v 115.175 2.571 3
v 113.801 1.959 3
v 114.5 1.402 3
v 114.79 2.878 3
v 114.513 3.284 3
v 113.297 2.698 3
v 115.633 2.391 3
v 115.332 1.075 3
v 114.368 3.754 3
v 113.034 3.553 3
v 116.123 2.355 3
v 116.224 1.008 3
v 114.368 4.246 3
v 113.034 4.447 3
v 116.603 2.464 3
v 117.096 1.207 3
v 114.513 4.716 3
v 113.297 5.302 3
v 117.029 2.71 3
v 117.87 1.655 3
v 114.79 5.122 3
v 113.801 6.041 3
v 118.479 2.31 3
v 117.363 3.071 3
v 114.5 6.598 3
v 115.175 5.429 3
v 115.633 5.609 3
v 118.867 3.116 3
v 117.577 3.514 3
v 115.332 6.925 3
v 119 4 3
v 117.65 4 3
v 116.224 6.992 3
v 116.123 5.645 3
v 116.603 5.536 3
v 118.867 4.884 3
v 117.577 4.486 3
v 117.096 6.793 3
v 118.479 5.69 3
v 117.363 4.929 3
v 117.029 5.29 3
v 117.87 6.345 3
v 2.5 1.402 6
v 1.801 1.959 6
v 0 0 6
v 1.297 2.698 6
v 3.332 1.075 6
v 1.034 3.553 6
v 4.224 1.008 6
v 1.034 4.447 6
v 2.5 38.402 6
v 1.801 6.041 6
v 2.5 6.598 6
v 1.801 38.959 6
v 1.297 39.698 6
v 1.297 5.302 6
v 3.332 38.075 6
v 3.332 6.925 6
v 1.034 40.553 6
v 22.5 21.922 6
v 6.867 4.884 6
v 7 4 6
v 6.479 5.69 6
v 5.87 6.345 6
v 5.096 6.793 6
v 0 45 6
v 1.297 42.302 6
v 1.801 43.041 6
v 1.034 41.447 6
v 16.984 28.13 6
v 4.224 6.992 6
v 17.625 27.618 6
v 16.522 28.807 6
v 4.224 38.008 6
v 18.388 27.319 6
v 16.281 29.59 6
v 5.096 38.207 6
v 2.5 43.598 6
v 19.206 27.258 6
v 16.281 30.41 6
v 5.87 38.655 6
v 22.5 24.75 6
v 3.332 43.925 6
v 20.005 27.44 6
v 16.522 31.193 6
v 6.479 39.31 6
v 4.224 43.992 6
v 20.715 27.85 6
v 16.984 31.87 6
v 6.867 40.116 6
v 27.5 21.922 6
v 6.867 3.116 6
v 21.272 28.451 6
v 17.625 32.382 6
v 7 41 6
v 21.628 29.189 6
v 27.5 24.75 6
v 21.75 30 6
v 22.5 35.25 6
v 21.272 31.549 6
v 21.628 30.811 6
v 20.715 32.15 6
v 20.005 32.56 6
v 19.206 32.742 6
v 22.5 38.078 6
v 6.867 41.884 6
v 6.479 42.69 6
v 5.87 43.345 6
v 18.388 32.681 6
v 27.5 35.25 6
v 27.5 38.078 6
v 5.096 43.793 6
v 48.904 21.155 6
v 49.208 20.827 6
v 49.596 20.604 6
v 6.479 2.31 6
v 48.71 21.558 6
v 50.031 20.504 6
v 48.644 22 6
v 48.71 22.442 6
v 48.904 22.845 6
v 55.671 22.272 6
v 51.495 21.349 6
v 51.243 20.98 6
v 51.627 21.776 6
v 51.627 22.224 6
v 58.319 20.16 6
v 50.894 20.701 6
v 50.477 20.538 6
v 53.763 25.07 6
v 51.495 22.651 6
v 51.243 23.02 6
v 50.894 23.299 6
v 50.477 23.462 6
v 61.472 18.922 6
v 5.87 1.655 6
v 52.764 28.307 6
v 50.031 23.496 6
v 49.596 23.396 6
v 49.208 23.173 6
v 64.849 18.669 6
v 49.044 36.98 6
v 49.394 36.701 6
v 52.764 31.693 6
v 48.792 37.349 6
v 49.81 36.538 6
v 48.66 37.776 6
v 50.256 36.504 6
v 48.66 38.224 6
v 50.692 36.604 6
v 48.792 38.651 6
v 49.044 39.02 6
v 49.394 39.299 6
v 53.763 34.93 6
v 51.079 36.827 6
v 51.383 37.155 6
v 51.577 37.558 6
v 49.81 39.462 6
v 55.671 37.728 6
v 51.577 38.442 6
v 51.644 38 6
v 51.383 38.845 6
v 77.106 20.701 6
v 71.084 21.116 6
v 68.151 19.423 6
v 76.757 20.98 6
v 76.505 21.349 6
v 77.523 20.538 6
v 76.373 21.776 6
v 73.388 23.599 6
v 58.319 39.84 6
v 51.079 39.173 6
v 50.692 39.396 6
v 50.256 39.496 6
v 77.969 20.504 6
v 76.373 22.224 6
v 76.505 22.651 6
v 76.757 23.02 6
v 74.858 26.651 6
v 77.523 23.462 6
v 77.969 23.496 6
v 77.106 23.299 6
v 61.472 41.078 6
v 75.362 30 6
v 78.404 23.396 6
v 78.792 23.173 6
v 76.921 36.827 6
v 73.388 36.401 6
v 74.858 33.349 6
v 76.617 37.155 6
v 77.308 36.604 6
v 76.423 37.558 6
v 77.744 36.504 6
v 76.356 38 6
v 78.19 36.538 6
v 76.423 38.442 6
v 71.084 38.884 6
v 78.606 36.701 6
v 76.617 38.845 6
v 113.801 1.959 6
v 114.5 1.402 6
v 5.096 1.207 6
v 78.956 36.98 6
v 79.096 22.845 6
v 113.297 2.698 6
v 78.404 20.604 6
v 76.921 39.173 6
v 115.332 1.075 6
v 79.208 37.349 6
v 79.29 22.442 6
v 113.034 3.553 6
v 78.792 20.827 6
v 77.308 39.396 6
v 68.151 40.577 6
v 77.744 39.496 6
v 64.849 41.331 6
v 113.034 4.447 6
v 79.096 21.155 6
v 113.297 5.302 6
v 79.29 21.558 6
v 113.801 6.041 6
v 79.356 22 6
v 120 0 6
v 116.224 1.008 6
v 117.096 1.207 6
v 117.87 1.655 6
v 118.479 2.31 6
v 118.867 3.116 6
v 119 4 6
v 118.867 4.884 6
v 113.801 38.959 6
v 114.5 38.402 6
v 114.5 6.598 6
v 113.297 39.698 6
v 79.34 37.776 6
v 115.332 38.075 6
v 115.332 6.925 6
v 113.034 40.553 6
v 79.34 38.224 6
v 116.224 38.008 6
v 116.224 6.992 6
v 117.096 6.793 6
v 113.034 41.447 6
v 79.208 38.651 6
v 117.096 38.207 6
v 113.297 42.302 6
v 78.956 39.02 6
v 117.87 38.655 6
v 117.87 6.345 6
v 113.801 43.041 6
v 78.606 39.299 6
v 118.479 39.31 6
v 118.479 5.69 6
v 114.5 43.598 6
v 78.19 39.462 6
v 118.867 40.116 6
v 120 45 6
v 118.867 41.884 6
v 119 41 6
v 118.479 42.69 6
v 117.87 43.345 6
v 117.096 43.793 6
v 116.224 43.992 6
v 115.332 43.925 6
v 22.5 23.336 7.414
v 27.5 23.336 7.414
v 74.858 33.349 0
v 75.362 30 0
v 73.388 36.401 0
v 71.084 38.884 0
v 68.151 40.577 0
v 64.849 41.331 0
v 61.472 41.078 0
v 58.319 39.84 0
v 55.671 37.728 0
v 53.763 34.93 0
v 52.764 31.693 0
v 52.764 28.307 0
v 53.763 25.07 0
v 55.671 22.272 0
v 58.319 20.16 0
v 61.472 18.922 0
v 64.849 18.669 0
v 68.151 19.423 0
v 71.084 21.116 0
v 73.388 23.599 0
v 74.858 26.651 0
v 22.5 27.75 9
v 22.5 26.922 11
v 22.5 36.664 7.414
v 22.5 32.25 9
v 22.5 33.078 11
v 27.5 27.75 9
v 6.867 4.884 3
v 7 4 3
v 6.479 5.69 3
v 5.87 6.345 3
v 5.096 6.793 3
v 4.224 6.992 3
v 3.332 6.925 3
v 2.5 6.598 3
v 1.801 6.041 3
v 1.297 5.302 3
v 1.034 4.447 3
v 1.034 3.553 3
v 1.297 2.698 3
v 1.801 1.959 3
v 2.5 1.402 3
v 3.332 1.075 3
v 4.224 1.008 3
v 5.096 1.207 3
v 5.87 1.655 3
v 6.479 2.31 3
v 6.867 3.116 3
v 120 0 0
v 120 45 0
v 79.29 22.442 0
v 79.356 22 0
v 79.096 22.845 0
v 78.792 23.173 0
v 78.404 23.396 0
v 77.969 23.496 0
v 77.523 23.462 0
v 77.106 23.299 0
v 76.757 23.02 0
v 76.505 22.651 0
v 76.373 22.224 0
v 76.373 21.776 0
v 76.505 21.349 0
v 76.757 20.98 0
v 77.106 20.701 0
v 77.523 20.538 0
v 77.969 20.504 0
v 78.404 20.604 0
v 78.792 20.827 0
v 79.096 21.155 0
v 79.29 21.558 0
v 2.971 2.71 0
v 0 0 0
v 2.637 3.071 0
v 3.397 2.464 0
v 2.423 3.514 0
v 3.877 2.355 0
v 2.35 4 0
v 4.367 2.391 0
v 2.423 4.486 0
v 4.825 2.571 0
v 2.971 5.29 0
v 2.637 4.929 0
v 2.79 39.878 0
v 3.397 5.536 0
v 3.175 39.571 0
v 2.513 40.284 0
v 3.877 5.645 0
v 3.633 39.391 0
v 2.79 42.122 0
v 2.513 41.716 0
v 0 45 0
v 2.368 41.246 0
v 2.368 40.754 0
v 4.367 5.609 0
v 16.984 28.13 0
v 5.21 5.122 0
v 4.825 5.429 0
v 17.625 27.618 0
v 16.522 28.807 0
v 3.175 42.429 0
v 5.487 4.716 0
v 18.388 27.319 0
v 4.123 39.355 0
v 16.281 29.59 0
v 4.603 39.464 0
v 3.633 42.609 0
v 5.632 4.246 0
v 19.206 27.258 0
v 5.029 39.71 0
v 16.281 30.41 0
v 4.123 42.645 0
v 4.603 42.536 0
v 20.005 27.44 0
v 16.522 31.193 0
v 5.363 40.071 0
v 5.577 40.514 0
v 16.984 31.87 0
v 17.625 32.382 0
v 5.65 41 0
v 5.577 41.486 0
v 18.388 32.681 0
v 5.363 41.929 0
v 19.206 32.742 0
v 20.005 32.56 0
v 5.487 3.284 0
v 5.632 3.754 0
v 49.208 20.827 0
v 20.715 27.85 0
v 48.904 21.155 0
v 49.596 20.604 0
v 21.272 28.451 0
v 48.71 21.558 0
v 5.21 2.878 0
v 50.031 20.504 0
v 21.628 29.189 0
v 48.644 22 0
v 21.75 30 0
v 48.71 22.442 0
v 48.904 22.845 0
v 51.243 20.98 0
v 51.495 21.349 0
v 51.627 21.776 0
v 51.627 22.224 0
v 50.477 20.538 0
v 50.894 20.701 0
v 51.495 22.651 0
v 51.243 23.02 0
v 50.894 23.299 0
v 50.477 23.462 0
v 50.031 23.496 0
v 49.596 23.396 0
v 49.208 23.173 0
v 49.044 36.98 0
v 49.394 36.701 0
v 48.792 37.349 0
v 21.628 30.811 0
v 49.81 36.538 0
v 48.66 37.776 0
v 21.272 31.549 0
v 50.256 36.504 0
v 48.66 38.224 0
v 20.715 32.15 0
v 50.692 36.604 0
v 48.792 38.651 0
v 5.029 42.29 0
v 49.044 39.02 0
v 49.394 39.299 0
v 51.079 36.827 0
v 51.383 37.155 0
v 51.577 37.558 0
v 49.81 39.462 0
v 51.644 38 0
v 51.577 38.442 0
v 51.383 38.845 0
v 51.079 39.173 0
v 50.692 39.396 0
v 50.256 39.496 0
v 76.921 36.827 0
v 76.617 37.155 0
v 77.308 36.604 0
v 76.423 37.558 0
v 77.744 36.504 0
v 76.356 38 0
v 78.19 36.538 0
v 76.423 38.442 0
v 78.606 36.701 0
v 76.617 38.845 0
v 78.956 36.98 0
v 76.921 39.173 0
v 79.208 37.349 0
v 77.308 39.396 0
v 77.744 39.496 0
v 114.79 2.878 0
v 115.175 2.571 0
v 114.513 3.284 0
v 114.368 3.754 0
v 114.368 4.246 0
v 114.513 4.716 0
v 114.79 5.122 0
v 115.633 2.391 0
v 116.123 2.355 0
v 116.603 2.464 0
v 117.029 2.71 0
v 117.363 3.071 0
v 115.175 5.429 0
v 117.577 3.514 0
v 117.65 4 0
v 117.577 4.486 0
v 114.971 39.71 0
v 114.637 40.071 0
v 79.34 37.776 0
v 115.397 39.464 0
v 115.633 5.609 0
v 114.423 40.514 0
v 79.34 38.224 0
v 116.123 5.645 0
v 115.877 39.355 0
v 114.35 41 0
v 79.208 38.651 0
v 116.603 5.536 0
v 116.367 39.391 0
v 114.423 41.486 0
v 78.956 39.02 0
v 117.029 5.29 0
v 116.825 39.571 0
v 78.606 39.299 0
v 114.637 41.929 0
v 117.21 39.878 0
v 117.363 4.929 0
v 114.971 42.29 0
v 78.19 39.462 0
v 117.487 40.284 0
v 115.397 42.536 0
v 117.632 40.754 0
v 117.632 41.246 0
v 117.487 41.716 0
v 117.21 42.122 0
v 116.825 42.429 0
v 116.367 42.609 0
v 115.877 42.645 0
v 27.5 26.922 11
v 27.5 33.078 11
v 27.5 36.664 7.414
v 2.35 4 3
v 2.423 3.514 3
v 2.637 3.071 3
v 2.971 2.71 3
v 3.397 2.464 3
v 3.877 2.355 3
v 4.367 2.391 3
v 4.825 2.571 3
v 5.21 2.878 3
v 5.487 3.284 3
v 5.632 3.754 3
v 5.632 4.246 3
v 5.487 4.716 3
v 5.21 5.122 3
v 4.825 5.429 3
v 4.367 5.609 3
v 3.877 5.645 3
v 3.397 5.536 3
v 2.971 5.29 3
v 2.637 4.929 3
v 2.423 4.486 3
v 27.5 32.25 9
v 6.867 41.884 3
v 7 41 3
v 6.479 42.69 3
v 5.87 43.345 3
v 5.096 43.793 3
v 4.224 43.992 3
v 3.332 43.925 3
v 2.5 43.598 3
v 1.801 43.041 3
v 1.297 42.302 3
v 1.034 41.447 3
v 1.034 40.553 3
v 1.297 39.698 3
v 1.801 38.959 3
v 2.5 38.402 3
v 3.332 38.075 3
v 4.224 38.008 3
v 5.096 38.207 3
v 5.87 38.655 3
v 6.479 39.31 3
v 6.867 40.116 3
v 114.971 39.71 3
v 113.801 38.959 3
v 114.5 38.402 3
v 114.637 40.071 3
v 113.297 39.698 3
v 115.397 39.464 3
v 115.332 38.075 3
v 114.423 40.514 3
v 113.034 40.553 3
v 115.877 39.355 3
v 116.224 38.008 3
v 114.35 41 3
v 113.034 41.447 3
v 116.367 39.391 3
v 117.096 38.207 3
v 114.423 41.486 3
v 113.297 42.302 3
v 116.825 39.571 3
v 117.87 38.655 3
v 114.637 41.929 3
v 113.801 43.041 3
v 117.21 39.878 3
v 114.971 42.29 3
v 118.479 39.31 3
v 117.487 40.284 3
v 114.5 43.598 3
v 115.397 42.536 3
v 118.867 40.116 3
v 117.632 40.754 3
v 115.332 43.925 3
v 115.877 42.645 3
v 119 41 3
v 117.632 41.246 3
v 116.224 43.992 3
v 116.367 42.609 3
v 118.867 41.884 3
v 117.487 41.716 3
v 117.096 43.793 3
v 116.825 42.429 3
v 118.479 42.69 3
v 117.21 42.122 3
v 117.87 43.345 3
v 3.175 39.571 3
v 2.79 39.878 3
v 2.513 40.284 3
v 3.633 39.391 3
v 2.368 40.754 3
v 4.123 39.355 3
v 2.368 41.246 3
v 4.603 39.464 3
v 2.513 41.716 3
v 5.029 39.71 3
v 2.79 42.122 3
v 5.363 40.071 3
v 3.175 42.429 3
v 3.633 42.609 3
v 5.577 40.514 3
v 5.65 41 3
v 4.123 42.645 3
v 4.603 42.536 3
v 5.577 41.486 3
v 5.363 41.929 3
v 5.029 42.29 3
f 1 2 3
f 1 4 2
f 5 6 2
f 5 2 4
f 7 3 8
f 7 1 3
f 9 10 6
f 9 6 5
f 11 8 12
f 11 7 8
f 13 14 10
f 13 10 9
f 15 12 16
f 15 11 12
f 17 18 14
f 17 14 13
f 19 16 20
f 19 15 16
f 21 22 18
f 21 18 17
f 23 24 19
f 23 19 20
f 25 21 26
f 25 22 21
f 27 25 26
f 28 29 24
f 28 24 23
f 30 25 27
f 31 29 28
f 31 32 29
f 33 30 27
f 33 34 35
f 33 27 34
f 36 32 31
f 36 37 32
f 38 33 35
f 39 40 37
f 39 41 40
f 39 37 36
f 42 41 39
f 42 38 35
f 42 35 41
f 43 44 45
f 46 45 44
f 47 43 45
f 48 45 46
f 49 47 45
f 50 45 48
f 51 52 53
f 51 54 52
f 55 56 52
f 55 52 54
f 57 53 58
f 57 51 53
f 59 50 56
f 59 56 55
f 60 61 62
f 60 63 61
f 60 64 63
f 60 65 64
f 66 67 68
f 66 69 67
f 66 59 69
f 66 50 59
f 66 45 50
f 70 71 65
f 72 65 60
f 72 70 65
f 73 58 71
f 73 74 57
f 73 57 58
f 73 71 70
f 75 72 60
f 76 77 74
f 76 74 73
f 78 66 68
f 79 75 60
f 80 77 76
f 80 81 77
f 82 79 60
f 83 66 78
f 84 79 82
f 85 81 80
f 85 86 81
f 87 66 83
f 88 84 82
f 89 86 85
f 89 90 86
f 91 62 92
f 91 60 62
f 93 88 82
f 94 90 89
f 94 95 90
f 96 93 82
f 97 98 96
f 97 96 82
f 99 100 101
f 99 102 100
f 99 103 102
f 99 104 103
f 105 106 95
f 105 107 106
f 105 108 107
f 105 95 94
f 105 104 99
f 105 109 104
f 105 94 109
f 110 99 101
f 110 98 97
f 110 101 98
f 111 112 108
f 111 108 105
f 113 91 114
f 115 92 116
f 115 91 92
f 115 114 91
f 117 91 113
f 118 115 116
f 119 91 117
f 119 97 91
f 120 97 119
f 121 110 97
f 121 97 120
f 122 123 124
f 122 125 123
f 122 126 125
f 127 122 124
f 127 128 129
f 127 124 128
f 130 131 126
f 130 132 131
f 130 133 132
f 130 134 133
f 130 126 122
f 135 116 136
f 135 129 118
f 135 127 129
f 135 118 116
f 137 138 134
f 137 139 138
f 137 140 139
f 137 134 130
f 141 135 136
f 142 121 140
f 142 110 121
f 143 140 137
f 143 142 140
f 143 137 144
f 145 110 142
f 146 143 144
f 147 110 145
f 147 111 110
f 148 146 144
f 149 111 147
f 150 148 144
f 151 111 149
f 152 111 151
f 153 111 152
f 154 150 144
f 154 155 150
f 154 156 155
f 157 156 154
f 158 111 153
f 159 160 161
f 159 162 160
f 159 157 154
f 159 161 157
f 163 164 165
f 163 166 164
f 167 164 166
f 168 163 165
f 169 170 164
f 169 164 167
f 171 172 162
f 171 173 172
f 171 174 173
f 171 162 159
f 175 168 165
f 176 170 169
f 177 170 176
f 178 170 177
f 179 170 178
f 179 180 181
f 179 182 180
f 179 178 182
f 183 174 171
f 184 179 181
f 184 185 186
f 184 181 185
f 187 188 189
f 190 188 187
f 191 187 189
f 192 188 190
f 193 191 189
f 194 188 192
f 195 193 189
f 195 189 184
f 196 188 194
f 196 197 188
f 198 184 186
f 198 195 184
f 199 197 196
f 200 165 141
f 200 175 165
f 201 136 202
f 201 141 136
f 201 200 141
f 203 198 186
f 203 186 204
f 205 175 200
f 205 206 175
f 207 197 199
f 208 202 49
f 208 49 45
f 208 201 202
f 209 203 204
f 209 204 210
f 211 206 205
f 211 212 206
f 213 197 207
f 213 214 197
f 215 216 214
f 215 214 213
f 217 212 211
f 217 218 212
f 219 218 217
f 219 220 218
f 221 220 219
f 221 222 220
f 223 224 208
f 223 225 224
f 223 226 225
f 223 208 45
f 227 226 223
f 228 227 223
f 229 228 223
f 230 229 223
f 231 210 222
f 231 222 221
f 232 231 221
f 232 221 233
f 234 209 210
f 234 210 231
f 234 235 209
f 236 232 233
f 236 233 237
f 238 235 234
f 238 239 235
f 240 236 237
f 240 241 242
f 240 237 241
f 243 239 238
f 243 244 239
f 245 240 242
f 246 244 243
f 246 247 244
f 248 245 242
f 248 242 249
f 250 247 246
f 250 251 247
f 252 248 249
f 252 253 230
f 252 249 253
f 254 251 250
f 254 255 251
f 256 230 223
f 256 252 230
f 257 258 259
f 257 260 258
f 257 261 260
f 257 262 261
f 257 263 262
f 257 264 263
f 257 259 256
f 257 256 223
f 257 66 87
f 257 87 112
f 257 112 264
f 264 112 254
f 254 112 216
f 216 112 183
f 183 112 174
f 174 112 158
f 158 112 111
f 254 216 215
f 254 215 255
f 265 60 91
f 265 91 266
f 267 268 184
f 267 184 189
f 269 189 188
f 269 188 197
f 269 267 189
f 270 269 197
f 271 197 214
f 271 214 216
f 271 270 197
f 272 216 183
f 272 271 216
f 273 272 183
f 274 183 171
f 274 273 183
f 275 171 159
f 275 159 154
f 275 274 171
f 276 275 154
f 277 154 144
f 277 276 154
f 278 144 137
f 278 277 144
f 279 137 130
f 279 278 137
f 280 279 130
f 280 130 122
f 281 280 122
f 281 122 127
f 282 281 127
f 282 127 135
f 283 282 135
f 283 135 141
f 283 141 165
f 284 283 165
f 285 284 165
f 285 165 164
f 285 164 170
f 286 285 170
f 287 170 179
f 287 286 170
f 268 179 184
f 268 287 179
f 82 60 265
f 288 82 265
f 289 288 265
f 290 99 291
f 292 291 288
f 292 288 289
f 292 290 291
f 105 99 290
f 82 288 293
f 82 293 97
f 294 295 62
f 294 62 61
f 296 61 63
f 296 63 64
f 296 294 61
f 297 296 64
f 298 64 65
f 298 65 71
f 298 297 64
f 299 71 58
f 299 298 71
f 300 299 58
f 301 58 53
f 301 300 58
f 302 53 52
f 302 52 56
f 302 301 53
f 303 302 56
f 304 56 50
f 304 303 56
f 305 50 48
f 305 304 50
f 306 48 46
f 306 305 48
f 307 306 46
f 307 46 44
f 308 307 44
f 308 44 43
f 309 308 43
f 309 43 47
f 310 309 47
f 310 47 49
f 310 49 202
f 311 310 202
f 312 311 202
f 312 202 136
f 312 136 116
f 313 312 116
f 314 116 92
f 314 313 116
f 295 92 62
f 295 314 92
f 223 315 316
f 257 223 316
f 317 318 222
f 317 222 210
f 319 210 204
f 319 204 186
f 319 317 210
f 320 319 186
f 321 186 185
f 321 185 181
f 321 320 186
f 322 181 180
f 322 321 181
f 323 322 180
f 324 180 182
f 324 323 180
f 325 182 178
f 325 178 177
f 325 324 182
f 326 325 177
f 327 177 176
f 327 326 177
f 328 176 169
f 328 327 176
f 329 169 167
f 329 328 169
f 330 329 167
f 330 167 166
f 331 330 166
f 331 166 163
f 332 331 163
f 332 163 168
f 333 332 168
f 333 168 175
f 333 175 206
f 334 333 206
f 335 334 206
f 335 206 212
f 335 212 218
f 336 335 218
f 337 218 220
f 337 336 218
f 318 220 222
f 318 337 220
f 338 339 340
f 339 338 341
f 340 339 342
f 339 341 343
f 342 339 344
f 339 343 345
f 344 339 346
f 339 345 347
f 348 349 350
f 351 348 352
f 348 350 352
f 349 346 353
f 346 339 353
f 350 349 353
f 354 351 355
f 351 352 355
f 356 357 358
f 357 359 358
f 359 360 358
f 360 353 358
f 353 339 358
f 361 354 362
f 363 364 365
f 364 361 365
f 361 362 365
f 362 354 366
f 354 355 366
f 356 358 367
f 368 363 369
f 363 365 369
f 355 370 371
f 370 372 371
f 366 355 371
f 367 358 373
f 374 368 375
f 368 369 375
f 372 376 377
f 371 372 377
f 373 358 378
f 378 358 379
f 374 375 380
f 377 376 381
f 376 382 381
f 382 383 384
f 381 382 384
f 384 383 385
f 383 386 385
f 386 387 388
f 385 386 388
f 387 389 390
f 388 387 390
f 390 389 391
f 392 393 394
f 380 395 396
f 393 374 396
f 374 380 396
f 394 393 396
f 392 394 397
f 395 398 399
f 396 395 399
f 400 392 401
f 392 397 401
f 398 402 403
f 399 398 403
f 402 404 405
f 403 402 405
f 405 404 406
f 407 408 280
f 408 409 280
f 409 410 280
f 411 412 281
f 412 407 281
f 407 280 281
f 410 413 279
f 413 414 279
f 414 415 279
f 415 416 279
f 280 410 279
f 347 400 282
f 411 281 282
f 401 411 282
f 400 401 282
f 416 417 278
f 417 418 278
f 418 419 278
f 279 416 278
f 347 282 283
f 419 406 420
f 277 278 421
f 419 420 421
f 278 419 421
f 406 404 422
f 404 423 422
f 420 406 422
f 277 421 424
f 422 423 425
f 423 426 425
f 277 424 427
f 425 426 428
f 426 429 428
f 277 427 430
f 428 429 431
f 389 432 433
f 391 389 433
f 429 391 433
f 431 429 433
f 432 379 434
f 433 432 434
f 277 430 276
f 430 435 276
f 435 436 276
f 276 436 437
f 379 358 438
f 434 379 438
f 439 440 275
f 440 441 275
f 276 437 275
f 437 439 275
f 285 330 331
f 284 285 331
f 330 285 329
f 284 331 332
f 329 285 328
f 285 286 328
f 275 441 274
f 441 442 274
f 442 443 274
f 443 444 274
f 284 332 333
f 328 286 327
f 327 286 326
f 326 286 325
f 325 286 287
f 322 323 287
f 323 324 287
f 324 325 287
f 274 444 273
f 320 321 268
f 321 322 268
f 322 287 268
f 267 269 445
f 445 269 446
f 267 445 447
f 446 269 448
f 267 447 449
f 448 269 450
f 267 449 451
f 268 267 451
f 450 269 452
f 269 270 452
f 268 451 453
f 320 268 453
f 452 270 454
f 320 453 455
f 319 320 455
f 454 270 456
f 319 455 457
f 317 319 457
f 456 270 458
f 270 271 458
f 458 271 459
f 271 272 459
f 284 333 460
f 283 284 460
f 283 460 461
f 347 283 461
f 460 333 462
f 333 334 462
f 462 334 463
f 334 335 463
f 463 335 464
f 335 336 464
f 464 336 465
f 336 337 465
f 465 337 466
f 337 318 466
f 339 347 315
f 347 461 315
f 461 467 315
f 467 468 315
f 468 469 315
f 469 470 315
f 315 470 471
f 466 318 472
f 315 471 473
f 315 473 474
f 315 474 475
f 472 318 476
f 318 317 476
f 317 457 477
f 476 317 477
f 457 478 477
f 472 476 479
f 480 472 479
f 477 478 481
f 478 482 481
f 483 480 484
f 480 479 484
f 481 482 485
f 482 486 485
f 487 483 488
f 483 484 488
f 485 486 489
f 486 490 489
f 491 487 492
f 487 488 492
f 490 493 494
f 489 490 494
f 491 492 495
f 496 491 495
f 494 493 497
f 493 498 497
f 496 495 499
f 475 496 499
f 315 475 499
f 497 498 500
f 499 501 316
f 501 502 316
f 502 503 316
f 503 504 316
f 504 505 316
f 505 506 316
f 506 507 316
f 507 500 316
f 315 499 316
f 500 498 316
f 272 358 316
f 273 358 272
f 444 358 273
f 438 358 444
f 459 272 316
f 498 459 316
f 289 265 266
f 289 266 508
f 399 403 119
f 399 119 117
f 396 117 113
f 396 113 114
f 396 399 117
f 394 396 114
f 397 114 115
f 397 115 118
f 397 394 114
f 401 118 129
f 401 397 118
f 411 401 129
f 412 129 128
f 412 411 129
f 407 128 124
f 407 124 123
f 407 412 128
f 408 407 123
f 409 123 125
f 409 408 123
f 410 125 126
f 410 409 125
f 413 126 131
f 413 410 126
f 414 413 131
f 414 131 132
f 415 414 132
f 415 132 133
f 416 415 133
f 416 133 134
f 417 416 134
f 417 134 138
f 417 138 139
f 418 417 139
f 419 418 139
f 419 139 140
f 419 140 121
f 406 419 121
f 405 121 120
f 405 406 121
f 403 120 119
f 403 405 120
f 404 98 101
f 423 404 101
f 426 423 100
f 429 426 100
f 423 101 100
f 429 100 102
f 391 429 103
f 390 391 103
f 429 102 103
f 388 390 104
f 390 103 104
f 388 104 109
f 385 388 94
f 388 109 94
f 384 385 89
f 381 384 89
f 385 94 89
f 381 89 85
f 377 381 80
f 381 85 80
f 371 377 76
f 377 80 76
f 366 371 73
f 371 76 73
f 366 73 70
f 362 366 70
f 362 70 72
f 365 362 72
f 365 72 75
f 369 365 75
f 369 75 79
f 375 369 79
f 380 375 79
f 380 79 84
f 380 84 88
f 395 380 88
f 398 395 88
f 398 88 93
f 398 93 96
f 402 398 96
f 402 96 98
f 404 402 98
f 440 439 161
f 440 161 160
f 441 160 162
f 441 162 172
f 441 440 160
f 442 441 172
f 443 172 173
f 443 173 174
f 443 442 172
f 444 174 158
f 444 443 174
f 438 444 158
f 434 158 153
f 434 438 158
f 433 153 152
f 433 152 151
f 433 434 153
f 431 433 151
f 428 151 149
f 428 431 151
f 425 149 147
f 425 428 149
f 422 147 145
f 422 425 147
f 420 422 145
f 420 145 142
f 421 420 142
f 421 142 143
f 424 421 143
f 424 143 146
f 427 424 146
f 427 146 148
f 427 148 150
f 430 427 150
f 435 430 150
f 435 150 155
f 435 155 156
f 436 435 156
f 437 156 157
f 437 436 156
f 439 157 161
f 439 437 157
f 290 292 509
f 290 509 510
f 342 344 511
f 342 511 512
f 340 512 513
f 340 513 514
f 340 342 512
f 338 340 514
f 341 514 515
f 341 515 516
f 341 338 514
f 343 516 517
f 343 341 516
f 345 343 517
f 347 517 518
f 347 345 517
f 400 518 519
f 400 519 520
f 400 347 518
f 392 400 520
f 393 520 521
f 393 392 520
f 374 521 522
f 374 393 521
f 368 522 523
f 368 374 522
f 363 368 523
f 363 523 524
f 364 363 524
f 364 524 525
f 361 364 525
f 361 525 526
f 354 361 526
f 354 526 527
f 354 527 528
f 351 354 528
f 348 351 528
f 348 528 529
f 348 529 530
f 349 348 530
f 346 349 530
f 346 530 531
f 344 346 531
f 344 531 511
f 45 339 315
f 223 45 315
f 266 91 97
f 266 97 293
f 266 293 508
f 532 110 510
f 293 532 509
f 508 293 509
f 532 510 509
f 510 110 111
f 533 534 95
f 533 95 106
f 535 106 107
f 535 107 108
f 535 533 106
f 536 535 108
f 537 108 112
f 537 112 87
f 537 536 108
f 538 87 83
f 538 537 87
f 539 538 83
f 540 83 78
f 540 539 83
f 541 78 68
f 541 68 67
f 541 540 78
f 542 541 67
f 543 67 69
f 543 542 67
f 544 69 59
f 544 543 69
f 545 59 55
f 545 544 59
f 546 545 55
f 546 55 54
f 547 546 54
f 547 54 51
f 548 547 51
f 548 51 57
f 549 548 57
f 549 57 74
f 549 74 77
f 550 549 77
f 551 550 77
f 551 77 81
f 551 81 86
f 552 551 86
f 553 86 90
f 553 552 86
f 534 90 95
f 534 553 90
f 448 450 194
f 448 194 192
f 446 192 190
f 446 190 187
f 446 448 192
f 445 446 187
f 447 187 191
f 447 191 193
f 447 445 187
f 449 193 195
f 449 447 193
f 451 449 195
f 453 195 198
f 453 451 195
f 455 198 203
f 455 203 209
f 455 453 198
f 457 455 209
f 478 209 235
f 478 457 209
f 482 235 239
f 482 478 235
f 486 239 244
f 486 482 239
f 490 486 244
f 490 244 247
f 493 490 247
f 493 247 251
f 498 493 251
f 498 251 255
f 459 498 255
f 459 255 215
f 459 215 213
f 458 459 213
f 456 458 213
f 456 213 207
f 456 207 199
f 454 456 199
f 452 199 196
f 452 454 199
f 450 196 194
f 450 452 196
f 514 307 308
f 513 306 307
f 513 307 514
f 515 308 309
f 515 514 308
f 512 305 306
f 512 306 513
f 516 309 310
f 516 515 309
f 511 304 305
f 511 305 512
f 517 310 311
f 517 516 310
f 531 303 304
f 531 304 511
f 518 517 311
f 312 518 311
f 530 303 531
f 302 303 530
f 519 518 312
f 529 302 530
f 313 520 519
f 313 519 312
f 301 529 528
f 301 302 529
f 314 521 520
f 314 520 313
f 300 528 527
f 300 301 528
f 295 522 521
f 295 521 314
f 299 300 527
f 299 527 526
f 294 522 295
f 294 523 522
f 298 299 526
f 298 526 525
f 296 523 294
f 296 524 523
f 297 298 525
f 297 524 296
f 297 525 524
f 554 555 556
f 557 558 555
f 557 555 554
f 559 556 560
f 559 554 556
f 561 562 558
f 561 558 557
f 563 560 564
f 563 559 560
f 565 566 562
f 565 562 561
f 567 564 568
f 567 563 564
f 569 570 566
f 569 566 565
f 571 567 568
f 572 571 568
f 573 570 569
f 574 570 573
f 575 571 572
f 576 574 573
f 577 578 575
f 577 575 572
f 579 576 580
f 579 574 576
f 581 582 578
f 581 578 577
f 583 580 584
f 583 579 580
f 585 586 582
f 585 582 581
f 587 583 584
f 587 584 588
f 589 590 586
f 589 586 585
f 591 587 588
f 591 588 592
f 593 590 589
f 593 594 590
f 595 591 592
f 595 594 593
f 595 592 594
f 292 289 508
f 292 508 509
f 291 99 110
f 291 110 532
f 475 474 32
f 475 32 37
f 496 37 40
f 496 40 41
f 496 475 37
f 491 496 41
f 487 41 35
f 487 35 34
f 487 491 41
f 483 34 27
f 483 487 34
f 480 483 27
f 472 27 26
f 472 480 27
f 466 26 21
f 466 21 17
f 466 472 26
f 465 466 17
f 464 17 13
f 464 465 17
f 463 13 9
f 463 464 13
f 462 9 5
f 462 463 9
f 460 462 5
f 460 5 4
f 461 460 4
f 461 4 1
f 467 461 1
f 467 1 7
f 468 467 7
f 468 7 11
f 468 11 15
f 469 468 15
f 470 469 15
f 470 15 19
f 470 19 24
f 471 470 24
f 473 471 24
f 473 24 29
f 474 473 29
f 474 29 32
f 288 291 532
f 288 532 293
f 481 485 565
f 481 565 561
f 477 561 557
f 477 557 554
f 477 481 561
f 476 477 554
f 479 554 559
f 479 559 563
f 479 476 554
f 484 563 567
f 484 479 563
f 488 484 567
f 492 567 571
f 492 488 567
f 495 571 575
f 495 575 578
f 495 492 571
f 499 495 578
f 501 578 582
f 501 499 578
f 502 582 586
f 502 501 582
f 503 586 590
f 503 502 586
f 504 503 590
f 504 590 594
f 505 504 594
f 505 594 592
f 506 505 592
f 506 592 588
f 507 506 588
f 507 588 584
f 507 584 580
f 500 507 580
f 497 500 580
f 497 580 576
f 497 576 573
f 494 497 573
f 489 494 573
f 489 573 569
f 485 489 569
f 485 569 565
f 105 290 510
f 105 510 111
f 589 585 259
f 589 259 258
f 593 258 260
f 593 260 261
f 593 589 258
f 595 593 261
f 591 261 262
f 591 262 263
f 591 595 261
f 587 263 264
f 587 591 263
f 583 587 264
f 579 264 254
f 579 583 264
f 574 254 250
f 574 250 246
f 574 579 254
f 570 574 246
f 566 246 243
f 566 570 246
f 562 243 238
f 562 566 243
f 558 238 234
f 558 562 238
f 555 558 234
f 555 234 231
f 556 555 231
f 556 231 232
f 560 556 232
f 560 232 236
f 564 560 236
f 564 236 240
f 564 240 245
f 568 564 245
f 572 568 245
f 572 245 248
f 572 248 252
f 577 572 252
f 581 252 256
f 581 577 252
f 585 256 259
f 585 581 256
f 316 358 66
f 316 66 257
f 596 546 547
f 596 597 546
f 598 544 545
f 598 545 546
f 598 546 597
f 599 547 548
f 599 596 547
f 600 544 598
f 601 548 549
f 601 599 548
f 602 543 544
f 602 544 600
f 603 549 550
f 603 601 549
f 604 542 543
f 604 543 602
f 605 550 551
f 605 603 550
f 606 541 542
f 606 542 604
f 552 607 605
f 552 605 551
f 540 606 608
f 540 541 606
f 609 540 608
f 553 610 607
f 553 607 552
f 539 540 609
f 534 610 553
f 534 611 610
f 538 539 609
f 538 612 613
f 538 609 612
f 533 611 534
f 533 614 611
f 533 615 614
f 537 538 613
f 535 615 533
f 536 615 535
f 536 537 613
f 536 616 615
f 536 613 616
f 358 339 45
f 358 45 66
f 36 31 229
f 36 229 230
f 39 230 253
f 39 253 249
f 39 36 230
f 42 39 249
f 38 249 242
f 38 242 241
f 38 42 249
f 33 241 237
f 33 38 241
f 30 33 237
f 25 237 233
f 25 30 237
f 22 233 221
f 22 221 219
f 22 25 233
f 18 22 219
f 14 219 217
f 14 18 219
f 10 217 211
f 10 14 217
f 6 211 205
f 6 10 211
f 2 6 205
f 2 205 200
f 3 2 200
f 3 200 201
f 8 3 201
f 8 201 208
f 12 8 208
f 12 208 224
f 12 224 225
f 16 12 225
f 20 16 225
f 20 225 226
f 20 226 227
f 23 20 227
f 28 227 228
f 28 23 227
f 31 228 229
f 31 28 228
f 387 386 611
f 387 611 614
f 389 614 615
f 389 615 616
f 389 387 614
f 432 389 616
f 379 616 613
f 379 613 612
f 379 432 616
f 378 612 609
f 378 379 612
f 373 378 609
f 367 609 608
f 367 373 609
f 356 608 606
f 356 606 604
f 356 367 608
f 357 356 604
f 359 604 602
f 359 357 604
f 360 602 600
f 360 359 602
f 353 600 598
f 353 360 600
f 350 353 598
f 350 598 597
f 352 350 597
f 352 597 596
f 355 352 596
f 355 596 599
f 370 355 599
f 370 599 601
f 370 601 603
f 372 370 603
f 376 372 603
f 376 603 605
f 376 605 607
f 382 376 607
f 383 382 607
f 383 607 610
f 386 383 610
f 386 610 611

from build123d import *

# Parameters (mm, degrees)
SKETCH1_W           = 120
SKETCH1_H           = 45
SKETCH1_R           = 11.3625
SKETCH1_R_2         = 1.65
SKETCH1_R_3         = 1.5
BOSS_EXTRUDE1_DEPTH = 6
CUT_EXTRUDE1_START  = -3
SKETCH2_R           = 3
SKETCH2_R_2         = 1.65
CUT_EXTRUDE1_DEPTH  = 3
SKETCH3_R           = 2.75
CUT_EXTRUDE2_DEPTH  = 129.300428682
BOSS_EXTRUDE2_START = -22.5
BOSS_EXTRUDE2_DEPTH = 5


with BuildPart() as part:
    # Sketch1 → Boss-Extrude1 (new body)
    with BuildSketch(Plane.XY):
        with Locations((60, 22.5)):
            Rectangle(SKETCH1_W, SKETCH1_H)
        with Locations((64, 30)):
            Circle(SKETCH1_R, mode=Mode.SUBTRACT)
        with Locations((4, 41)):
            Circle(SKETCH1_R_2, mode=Mode.SUBTRACT)
        with Locations(Location((4, 4, 0), (0, 0, 180))):
            Circle(SKETCH1_R_2, mode=Mode.SUBTRACT)
        with Locations(Location((116, 41, 0), (0, 0, 180))):
            Circle(SKETCH1_R_2, mode=Mode.SUBTRACT)
        with Locations((116, 4)):
            Circle(SKETCH1_R_2, mode=Mode.SUBTRACT)
        with Locations((50.143593539, 38)):
            Circle(SKETCH1_R_3, mode=Mode.SUBTRACT)
        with Locations(Location((50.143593539, 22, 0), (0, 0, 180))):
            Circle(SKETCH1_R_3, mode=Mode.SUBTRACT)
        with Locations((77.856406461, 22)):
            Circle(SKETCH1_R_3, mode=Mode.SUBTRACT)
        with Locations(Location((77.856406461, 38, 0), (0, 0, 180))):
            Circle(SKETCH1_R_3, mode=Mode.SUBTRACT)
    extrude(amount=BOSS_EXTRUDE1_DEPTH)

    # Sketch2 → Cut-Extrude1 (cut)
    # profile 1 of 4: a face of its own
    with BuildSketch(Plane.XY.offset(6).offset(CUT_EXTRUDE1_START)):
        with Locations((4, 41)):
            Circle(SKETCH2_R)
        with Locations((4, 41)):
            Circle(SKETCH2_R_2, mode=Mode.SUBTRACT)
    # profile 2 of 4: a face of its own
    with BuildSketch(Plane.XY.offset(6).offset(CUT_EXTRUDE1_START)):
        with Locations((4, 4)):
            Circle(SKETCH2_R)
        with Locations(Location((4, 4, 0), (0, 0, 180))):
            Circle(SKETCH2_R_2, mode=Mode.SUBTRACT)
    # profile 3 of 4: a face of its own
    with BuildSketch(Plane.XY.offset(6).offset(CUT_EXTRUDE1_START)):
        with Locations((116, 4)):
            Circle(SKETCH2_R)
        with Locations((116, 4)):
            Circle(SKETCH2_R_2, mode=Mode.SUBTRACT)
    # profile 4 of 4: a face of its own
    with BuildSketch(Plane.XY.offset(6).offset(CUT_EXTRUDE1_START)):
        with Locations((116, 41)):
            Circle(SKETCH2_R)
        with Locations(Location((116, 41, 0), (0, 0, 180))):
            Circle(SKETCH2_R_2, mode=Mode.SUBTRACT)
    extrude(amount=CUT_EXTRUDE1_DEPTH, mode=Mode.SUBTRACT)

    # Sketch3 → Cut-Extrude2 (cut, through all)
    with BuildSketch(Plane.XY.offset(6)):
        with Locations((19, 30)):
            Circle(SKETCH3_R)
    extrude(amount=-CUT_EXTRUDE2_DEPTH, mode=Mode.SUBTRACT)

    # Sketch4 → Boss-Extrude2 (add)
    with BuildSketch(Plane.ZY.offset(BOSS_EXTRUDE2_START)):
        Polygon((6, 35.25), (9, 32.25), (9, 27.75), (6, 24.75), (6, 21.921572875), (7.414213562, 23.335786438), (11, 26.921572875), (11, 33.078427125), (7.414213562, 36.664213562), (6, 38.078427125), align=None)
    extrude(amount=-BOSS_EXTRUDE2_DEPTH)


solid = part.part
